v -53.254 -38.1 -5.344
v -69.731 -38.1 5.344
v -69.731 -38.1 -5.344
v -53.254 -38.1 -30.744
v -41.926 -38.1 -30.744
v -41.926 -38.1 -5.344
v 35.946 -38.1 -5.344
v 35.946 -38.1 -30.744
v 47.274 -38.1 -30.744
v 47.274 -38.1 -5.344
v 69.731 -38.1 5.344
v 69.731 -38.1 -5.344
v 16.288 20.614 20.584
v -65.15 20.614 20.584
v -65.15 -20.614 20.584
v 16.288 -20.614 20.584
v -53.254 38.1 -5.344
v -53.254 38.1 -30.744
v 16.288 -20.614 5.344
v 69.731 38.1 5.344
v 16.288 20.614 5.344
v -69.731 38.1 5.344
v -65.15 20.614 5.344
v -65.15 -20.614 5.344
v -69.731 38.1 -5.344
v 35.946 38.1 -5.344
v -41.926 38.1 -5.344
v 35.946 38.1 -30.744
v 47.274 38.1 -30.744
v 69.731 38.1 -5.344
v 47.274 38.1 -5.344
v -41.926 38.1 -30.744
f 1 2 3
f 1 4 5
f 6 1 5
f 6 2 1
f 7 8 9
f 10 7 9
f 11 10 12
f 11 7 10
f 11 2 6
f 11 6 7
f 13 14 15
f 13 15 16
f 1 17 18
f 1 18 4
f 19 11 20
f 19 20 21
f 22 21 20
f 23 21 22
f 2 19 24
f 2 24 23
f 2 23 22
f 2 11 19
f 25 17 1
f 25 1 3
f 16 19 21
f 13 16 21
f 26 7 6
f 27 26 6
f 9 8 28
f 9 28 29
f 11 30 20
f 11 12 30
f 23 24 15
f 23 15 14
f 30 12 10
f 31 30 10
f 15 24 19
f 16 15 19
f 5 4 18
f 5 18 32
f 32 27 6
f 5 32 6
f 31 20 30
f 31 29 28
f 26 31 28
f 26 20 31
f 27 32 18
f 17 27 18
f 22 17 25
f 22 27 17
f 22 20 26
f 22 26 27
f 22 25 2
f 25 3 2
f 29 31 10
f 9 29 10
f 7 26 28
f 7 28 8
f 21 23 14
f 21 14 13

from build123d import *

# Parameters (mm, degrees)
F0_W     = 139.4626796246
F0_H     = 10.6887500733
F1_DEPTH = 38.1
F2_W     = 139.4626796246
F2_H     = 10.6887500733
F3_DEPTH = 38.1
F4_W     = 11.3281075606
F4_H     = 76.2
F5_DEPTH = 25.4
F6_W     = 11.3281150824
F6_H     = 76.2
F7_DEPTH = 25.4
F8_W     = 81.4380571246
F8_H     = 41.2280112505
F9_DEPTH = 15.24


# Not quite as in the source:
# - the program builds the solid bodies; features that only make, move or delete a surface that nothing else refers to are left out


with BuildPart() as f1:
    # F0 (on Front) → F1 (new body)
    with BuildSketch(Plane.XZ):
        Rectangle(F0_W, F0_H)
    extrude(amount=F1_DEPTH)

    # F2 (on face) → F3 (join)
    with BuildSketch(Plane(origin=(0, 0, 0), x_dir=(-1, 0, 0), z_dir=(0, 1, 0))):
        Rectangle(F2_W, F2_H)
    extrude(amount=F3_DEPTH)

    # F4 (on face) → F5 (join)
    with BuildSketch(Plane(origin=(0, 0, -5.3443750367), x_dir=(1, 0, 0), z_dir=(0, 0, -1))):
        with Locations((-47.5903637707, 0)):
            Rectangle(F4_W, F4_H)
    extrude(amount=F5_DEPTH)

    # F6 (on face) → F7 (join)
    with BuildSketch(Plane(origin=(0, 0, -5.3443750367), x_dir=(1, 0, 0), z_dir=(0, 0, -1))):
        with Locations((41.6097603738, 0)):
            Rectangle(F6_W, F6_H)
    extrude(amount=F7_DEPTH)

    # F8 (on face) → F9 (join)
    with BuildSketch(Plane.XY.offset(5.3443750367)):
        with Locations((-24.4314149022, 0)):
            Rectangle(F8_W, F8_H)
    extrude(amount=F9_DEPTH)


solid = f1.part
